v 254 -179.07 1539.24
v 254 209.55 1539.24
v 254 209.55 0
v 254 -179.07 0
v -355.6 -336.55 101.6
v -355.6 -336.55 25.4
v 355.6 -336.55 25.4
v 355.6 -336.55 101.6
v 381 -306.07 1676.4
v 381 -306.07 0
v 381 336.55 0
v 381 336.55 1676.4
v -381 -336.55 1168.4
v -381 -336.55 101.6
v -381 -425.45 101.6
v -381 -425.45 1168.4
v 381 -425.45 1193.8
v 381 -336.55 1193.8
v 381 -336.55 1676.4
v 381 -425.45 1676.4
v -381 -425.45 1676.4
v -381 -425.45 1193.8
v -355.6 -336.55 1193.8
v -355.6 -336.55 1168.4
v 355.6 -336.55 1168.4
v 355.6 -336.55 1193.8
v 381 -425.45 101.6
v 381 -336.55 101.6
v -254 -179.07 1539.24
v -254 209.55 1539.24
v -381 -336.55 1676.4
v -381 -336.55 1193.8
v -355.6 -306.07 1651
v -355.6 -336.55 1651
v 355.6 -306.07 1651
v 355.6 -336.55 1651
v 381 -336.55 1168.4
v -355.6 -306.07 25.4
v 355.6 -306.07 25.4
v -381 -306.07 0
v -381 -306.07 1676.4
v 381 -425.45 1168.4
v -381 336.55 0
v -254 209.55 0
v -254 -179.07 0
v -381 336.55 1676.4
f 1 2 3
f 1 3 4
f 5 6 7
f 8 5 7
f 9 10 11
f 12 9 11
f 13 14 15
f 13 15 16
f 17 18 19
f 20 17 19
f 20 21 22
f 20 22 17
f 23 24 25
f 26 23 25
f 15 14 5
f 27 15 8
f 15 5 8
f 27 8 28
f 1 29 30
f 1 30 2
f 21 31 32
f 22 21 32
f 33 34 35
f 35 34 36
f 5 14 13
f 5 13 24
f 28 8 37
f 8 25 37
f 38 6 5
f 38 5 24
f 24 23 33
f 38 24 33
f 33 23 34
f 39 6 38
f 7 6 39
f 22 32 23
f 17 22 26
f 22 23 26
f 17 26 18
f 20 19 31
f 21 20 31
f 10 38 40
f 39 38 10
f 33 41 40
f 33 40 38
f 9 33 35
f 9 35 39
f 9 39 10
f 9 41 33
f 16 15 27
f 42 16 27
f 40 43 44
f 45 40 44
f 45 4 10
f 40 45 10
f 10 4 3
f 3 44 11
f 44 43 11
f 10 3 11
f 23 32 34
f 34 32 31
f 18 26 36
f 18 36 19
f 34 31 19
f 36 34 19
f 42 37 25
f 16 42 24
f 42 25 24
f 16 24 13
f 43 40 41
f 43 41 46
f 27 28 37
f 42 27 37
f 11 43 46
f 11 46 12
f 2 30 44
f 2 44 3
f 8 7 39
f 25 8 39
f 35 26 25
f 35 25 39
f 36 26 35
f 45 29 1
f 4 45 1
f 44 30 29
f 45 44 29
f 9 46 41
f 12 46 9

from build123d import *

# Parameters (mm, degrees)
F0_W     = 762
F0_H     = 673.1
F1_DEPTH = 1676.4
F2_W     = 762
F2_H     = 1676.4
F2_W_2   = 711.2
F2_H_2   = 1625.6
F3_DEPTH = 30.48
F4_W     = 711.2
F4_H     = 457.2
F4_W_2   = 25.4
F4_H_2   = 1066.8
F5_DEPTH = 88.9
F6_W     = 508
F6_H     = 388.62
F7_DEPTH = 1539.24


with BuildPart() as f1:
    # F0 (on Top) → F1 (new body)
    with BuildSketch(Plane.XY):
        Rectangle(F0_W, F0_H)
    extrude(amount=F1_DEPTH)

    # F2 (on face) → F3 (cut)
    with BuildSketch(Plane.XZ.offset(336.55)):
        with Locations((0, 838.2)):
            Rectangle(F2_W, F2_H)
        with Locations((0, 838.2)):
            Rectangle(F2_W_2, F2_H_2, mode=Mode.SUBTRACT)
    extrude(amount=-F3_DEPTH, mode=Mode.SUBTRACT)

    # F4 (on face) → F5 (join)
    with BuildSketch(Plane.XZ.offset(336.55)):
        with Locations((0, 1422.4)):
            Rectangle(F4_W, F4_H)
        Polygon((381, 1676.4), (-381, 1676.4), (-381, 1193.8), (-355.6, 1193.8), (-355.6, 1651), (355.6, 1651), (355.6, 1193.8), (381, 1193.8), align=None)
        with Locations((368.3, 635)):
            Rectangle(F4_W_2, F4_H_2)
        with Locations((0, 635)):
            Rectangle(F4_W, F4_H_2)
        with Locations((-368.3, 635)):
            Rectangle(F4_W_2, F4_H_2)
    extrude(amount=F5_DEPTH)

    # F6 (on face) → F7 (cut)
    with BuildSketch(Plane(origin=(0, 0, 0), x_dir=(1, 0, 0), z_dir=(0, 0, -1))):
        with Locations((0, -15.24)):
            Rectangle(F6_W, F6_H)
    extrude(amount=-F7_DEPTH, mode=Mode.SUBTRACT)


solid = f1.part
